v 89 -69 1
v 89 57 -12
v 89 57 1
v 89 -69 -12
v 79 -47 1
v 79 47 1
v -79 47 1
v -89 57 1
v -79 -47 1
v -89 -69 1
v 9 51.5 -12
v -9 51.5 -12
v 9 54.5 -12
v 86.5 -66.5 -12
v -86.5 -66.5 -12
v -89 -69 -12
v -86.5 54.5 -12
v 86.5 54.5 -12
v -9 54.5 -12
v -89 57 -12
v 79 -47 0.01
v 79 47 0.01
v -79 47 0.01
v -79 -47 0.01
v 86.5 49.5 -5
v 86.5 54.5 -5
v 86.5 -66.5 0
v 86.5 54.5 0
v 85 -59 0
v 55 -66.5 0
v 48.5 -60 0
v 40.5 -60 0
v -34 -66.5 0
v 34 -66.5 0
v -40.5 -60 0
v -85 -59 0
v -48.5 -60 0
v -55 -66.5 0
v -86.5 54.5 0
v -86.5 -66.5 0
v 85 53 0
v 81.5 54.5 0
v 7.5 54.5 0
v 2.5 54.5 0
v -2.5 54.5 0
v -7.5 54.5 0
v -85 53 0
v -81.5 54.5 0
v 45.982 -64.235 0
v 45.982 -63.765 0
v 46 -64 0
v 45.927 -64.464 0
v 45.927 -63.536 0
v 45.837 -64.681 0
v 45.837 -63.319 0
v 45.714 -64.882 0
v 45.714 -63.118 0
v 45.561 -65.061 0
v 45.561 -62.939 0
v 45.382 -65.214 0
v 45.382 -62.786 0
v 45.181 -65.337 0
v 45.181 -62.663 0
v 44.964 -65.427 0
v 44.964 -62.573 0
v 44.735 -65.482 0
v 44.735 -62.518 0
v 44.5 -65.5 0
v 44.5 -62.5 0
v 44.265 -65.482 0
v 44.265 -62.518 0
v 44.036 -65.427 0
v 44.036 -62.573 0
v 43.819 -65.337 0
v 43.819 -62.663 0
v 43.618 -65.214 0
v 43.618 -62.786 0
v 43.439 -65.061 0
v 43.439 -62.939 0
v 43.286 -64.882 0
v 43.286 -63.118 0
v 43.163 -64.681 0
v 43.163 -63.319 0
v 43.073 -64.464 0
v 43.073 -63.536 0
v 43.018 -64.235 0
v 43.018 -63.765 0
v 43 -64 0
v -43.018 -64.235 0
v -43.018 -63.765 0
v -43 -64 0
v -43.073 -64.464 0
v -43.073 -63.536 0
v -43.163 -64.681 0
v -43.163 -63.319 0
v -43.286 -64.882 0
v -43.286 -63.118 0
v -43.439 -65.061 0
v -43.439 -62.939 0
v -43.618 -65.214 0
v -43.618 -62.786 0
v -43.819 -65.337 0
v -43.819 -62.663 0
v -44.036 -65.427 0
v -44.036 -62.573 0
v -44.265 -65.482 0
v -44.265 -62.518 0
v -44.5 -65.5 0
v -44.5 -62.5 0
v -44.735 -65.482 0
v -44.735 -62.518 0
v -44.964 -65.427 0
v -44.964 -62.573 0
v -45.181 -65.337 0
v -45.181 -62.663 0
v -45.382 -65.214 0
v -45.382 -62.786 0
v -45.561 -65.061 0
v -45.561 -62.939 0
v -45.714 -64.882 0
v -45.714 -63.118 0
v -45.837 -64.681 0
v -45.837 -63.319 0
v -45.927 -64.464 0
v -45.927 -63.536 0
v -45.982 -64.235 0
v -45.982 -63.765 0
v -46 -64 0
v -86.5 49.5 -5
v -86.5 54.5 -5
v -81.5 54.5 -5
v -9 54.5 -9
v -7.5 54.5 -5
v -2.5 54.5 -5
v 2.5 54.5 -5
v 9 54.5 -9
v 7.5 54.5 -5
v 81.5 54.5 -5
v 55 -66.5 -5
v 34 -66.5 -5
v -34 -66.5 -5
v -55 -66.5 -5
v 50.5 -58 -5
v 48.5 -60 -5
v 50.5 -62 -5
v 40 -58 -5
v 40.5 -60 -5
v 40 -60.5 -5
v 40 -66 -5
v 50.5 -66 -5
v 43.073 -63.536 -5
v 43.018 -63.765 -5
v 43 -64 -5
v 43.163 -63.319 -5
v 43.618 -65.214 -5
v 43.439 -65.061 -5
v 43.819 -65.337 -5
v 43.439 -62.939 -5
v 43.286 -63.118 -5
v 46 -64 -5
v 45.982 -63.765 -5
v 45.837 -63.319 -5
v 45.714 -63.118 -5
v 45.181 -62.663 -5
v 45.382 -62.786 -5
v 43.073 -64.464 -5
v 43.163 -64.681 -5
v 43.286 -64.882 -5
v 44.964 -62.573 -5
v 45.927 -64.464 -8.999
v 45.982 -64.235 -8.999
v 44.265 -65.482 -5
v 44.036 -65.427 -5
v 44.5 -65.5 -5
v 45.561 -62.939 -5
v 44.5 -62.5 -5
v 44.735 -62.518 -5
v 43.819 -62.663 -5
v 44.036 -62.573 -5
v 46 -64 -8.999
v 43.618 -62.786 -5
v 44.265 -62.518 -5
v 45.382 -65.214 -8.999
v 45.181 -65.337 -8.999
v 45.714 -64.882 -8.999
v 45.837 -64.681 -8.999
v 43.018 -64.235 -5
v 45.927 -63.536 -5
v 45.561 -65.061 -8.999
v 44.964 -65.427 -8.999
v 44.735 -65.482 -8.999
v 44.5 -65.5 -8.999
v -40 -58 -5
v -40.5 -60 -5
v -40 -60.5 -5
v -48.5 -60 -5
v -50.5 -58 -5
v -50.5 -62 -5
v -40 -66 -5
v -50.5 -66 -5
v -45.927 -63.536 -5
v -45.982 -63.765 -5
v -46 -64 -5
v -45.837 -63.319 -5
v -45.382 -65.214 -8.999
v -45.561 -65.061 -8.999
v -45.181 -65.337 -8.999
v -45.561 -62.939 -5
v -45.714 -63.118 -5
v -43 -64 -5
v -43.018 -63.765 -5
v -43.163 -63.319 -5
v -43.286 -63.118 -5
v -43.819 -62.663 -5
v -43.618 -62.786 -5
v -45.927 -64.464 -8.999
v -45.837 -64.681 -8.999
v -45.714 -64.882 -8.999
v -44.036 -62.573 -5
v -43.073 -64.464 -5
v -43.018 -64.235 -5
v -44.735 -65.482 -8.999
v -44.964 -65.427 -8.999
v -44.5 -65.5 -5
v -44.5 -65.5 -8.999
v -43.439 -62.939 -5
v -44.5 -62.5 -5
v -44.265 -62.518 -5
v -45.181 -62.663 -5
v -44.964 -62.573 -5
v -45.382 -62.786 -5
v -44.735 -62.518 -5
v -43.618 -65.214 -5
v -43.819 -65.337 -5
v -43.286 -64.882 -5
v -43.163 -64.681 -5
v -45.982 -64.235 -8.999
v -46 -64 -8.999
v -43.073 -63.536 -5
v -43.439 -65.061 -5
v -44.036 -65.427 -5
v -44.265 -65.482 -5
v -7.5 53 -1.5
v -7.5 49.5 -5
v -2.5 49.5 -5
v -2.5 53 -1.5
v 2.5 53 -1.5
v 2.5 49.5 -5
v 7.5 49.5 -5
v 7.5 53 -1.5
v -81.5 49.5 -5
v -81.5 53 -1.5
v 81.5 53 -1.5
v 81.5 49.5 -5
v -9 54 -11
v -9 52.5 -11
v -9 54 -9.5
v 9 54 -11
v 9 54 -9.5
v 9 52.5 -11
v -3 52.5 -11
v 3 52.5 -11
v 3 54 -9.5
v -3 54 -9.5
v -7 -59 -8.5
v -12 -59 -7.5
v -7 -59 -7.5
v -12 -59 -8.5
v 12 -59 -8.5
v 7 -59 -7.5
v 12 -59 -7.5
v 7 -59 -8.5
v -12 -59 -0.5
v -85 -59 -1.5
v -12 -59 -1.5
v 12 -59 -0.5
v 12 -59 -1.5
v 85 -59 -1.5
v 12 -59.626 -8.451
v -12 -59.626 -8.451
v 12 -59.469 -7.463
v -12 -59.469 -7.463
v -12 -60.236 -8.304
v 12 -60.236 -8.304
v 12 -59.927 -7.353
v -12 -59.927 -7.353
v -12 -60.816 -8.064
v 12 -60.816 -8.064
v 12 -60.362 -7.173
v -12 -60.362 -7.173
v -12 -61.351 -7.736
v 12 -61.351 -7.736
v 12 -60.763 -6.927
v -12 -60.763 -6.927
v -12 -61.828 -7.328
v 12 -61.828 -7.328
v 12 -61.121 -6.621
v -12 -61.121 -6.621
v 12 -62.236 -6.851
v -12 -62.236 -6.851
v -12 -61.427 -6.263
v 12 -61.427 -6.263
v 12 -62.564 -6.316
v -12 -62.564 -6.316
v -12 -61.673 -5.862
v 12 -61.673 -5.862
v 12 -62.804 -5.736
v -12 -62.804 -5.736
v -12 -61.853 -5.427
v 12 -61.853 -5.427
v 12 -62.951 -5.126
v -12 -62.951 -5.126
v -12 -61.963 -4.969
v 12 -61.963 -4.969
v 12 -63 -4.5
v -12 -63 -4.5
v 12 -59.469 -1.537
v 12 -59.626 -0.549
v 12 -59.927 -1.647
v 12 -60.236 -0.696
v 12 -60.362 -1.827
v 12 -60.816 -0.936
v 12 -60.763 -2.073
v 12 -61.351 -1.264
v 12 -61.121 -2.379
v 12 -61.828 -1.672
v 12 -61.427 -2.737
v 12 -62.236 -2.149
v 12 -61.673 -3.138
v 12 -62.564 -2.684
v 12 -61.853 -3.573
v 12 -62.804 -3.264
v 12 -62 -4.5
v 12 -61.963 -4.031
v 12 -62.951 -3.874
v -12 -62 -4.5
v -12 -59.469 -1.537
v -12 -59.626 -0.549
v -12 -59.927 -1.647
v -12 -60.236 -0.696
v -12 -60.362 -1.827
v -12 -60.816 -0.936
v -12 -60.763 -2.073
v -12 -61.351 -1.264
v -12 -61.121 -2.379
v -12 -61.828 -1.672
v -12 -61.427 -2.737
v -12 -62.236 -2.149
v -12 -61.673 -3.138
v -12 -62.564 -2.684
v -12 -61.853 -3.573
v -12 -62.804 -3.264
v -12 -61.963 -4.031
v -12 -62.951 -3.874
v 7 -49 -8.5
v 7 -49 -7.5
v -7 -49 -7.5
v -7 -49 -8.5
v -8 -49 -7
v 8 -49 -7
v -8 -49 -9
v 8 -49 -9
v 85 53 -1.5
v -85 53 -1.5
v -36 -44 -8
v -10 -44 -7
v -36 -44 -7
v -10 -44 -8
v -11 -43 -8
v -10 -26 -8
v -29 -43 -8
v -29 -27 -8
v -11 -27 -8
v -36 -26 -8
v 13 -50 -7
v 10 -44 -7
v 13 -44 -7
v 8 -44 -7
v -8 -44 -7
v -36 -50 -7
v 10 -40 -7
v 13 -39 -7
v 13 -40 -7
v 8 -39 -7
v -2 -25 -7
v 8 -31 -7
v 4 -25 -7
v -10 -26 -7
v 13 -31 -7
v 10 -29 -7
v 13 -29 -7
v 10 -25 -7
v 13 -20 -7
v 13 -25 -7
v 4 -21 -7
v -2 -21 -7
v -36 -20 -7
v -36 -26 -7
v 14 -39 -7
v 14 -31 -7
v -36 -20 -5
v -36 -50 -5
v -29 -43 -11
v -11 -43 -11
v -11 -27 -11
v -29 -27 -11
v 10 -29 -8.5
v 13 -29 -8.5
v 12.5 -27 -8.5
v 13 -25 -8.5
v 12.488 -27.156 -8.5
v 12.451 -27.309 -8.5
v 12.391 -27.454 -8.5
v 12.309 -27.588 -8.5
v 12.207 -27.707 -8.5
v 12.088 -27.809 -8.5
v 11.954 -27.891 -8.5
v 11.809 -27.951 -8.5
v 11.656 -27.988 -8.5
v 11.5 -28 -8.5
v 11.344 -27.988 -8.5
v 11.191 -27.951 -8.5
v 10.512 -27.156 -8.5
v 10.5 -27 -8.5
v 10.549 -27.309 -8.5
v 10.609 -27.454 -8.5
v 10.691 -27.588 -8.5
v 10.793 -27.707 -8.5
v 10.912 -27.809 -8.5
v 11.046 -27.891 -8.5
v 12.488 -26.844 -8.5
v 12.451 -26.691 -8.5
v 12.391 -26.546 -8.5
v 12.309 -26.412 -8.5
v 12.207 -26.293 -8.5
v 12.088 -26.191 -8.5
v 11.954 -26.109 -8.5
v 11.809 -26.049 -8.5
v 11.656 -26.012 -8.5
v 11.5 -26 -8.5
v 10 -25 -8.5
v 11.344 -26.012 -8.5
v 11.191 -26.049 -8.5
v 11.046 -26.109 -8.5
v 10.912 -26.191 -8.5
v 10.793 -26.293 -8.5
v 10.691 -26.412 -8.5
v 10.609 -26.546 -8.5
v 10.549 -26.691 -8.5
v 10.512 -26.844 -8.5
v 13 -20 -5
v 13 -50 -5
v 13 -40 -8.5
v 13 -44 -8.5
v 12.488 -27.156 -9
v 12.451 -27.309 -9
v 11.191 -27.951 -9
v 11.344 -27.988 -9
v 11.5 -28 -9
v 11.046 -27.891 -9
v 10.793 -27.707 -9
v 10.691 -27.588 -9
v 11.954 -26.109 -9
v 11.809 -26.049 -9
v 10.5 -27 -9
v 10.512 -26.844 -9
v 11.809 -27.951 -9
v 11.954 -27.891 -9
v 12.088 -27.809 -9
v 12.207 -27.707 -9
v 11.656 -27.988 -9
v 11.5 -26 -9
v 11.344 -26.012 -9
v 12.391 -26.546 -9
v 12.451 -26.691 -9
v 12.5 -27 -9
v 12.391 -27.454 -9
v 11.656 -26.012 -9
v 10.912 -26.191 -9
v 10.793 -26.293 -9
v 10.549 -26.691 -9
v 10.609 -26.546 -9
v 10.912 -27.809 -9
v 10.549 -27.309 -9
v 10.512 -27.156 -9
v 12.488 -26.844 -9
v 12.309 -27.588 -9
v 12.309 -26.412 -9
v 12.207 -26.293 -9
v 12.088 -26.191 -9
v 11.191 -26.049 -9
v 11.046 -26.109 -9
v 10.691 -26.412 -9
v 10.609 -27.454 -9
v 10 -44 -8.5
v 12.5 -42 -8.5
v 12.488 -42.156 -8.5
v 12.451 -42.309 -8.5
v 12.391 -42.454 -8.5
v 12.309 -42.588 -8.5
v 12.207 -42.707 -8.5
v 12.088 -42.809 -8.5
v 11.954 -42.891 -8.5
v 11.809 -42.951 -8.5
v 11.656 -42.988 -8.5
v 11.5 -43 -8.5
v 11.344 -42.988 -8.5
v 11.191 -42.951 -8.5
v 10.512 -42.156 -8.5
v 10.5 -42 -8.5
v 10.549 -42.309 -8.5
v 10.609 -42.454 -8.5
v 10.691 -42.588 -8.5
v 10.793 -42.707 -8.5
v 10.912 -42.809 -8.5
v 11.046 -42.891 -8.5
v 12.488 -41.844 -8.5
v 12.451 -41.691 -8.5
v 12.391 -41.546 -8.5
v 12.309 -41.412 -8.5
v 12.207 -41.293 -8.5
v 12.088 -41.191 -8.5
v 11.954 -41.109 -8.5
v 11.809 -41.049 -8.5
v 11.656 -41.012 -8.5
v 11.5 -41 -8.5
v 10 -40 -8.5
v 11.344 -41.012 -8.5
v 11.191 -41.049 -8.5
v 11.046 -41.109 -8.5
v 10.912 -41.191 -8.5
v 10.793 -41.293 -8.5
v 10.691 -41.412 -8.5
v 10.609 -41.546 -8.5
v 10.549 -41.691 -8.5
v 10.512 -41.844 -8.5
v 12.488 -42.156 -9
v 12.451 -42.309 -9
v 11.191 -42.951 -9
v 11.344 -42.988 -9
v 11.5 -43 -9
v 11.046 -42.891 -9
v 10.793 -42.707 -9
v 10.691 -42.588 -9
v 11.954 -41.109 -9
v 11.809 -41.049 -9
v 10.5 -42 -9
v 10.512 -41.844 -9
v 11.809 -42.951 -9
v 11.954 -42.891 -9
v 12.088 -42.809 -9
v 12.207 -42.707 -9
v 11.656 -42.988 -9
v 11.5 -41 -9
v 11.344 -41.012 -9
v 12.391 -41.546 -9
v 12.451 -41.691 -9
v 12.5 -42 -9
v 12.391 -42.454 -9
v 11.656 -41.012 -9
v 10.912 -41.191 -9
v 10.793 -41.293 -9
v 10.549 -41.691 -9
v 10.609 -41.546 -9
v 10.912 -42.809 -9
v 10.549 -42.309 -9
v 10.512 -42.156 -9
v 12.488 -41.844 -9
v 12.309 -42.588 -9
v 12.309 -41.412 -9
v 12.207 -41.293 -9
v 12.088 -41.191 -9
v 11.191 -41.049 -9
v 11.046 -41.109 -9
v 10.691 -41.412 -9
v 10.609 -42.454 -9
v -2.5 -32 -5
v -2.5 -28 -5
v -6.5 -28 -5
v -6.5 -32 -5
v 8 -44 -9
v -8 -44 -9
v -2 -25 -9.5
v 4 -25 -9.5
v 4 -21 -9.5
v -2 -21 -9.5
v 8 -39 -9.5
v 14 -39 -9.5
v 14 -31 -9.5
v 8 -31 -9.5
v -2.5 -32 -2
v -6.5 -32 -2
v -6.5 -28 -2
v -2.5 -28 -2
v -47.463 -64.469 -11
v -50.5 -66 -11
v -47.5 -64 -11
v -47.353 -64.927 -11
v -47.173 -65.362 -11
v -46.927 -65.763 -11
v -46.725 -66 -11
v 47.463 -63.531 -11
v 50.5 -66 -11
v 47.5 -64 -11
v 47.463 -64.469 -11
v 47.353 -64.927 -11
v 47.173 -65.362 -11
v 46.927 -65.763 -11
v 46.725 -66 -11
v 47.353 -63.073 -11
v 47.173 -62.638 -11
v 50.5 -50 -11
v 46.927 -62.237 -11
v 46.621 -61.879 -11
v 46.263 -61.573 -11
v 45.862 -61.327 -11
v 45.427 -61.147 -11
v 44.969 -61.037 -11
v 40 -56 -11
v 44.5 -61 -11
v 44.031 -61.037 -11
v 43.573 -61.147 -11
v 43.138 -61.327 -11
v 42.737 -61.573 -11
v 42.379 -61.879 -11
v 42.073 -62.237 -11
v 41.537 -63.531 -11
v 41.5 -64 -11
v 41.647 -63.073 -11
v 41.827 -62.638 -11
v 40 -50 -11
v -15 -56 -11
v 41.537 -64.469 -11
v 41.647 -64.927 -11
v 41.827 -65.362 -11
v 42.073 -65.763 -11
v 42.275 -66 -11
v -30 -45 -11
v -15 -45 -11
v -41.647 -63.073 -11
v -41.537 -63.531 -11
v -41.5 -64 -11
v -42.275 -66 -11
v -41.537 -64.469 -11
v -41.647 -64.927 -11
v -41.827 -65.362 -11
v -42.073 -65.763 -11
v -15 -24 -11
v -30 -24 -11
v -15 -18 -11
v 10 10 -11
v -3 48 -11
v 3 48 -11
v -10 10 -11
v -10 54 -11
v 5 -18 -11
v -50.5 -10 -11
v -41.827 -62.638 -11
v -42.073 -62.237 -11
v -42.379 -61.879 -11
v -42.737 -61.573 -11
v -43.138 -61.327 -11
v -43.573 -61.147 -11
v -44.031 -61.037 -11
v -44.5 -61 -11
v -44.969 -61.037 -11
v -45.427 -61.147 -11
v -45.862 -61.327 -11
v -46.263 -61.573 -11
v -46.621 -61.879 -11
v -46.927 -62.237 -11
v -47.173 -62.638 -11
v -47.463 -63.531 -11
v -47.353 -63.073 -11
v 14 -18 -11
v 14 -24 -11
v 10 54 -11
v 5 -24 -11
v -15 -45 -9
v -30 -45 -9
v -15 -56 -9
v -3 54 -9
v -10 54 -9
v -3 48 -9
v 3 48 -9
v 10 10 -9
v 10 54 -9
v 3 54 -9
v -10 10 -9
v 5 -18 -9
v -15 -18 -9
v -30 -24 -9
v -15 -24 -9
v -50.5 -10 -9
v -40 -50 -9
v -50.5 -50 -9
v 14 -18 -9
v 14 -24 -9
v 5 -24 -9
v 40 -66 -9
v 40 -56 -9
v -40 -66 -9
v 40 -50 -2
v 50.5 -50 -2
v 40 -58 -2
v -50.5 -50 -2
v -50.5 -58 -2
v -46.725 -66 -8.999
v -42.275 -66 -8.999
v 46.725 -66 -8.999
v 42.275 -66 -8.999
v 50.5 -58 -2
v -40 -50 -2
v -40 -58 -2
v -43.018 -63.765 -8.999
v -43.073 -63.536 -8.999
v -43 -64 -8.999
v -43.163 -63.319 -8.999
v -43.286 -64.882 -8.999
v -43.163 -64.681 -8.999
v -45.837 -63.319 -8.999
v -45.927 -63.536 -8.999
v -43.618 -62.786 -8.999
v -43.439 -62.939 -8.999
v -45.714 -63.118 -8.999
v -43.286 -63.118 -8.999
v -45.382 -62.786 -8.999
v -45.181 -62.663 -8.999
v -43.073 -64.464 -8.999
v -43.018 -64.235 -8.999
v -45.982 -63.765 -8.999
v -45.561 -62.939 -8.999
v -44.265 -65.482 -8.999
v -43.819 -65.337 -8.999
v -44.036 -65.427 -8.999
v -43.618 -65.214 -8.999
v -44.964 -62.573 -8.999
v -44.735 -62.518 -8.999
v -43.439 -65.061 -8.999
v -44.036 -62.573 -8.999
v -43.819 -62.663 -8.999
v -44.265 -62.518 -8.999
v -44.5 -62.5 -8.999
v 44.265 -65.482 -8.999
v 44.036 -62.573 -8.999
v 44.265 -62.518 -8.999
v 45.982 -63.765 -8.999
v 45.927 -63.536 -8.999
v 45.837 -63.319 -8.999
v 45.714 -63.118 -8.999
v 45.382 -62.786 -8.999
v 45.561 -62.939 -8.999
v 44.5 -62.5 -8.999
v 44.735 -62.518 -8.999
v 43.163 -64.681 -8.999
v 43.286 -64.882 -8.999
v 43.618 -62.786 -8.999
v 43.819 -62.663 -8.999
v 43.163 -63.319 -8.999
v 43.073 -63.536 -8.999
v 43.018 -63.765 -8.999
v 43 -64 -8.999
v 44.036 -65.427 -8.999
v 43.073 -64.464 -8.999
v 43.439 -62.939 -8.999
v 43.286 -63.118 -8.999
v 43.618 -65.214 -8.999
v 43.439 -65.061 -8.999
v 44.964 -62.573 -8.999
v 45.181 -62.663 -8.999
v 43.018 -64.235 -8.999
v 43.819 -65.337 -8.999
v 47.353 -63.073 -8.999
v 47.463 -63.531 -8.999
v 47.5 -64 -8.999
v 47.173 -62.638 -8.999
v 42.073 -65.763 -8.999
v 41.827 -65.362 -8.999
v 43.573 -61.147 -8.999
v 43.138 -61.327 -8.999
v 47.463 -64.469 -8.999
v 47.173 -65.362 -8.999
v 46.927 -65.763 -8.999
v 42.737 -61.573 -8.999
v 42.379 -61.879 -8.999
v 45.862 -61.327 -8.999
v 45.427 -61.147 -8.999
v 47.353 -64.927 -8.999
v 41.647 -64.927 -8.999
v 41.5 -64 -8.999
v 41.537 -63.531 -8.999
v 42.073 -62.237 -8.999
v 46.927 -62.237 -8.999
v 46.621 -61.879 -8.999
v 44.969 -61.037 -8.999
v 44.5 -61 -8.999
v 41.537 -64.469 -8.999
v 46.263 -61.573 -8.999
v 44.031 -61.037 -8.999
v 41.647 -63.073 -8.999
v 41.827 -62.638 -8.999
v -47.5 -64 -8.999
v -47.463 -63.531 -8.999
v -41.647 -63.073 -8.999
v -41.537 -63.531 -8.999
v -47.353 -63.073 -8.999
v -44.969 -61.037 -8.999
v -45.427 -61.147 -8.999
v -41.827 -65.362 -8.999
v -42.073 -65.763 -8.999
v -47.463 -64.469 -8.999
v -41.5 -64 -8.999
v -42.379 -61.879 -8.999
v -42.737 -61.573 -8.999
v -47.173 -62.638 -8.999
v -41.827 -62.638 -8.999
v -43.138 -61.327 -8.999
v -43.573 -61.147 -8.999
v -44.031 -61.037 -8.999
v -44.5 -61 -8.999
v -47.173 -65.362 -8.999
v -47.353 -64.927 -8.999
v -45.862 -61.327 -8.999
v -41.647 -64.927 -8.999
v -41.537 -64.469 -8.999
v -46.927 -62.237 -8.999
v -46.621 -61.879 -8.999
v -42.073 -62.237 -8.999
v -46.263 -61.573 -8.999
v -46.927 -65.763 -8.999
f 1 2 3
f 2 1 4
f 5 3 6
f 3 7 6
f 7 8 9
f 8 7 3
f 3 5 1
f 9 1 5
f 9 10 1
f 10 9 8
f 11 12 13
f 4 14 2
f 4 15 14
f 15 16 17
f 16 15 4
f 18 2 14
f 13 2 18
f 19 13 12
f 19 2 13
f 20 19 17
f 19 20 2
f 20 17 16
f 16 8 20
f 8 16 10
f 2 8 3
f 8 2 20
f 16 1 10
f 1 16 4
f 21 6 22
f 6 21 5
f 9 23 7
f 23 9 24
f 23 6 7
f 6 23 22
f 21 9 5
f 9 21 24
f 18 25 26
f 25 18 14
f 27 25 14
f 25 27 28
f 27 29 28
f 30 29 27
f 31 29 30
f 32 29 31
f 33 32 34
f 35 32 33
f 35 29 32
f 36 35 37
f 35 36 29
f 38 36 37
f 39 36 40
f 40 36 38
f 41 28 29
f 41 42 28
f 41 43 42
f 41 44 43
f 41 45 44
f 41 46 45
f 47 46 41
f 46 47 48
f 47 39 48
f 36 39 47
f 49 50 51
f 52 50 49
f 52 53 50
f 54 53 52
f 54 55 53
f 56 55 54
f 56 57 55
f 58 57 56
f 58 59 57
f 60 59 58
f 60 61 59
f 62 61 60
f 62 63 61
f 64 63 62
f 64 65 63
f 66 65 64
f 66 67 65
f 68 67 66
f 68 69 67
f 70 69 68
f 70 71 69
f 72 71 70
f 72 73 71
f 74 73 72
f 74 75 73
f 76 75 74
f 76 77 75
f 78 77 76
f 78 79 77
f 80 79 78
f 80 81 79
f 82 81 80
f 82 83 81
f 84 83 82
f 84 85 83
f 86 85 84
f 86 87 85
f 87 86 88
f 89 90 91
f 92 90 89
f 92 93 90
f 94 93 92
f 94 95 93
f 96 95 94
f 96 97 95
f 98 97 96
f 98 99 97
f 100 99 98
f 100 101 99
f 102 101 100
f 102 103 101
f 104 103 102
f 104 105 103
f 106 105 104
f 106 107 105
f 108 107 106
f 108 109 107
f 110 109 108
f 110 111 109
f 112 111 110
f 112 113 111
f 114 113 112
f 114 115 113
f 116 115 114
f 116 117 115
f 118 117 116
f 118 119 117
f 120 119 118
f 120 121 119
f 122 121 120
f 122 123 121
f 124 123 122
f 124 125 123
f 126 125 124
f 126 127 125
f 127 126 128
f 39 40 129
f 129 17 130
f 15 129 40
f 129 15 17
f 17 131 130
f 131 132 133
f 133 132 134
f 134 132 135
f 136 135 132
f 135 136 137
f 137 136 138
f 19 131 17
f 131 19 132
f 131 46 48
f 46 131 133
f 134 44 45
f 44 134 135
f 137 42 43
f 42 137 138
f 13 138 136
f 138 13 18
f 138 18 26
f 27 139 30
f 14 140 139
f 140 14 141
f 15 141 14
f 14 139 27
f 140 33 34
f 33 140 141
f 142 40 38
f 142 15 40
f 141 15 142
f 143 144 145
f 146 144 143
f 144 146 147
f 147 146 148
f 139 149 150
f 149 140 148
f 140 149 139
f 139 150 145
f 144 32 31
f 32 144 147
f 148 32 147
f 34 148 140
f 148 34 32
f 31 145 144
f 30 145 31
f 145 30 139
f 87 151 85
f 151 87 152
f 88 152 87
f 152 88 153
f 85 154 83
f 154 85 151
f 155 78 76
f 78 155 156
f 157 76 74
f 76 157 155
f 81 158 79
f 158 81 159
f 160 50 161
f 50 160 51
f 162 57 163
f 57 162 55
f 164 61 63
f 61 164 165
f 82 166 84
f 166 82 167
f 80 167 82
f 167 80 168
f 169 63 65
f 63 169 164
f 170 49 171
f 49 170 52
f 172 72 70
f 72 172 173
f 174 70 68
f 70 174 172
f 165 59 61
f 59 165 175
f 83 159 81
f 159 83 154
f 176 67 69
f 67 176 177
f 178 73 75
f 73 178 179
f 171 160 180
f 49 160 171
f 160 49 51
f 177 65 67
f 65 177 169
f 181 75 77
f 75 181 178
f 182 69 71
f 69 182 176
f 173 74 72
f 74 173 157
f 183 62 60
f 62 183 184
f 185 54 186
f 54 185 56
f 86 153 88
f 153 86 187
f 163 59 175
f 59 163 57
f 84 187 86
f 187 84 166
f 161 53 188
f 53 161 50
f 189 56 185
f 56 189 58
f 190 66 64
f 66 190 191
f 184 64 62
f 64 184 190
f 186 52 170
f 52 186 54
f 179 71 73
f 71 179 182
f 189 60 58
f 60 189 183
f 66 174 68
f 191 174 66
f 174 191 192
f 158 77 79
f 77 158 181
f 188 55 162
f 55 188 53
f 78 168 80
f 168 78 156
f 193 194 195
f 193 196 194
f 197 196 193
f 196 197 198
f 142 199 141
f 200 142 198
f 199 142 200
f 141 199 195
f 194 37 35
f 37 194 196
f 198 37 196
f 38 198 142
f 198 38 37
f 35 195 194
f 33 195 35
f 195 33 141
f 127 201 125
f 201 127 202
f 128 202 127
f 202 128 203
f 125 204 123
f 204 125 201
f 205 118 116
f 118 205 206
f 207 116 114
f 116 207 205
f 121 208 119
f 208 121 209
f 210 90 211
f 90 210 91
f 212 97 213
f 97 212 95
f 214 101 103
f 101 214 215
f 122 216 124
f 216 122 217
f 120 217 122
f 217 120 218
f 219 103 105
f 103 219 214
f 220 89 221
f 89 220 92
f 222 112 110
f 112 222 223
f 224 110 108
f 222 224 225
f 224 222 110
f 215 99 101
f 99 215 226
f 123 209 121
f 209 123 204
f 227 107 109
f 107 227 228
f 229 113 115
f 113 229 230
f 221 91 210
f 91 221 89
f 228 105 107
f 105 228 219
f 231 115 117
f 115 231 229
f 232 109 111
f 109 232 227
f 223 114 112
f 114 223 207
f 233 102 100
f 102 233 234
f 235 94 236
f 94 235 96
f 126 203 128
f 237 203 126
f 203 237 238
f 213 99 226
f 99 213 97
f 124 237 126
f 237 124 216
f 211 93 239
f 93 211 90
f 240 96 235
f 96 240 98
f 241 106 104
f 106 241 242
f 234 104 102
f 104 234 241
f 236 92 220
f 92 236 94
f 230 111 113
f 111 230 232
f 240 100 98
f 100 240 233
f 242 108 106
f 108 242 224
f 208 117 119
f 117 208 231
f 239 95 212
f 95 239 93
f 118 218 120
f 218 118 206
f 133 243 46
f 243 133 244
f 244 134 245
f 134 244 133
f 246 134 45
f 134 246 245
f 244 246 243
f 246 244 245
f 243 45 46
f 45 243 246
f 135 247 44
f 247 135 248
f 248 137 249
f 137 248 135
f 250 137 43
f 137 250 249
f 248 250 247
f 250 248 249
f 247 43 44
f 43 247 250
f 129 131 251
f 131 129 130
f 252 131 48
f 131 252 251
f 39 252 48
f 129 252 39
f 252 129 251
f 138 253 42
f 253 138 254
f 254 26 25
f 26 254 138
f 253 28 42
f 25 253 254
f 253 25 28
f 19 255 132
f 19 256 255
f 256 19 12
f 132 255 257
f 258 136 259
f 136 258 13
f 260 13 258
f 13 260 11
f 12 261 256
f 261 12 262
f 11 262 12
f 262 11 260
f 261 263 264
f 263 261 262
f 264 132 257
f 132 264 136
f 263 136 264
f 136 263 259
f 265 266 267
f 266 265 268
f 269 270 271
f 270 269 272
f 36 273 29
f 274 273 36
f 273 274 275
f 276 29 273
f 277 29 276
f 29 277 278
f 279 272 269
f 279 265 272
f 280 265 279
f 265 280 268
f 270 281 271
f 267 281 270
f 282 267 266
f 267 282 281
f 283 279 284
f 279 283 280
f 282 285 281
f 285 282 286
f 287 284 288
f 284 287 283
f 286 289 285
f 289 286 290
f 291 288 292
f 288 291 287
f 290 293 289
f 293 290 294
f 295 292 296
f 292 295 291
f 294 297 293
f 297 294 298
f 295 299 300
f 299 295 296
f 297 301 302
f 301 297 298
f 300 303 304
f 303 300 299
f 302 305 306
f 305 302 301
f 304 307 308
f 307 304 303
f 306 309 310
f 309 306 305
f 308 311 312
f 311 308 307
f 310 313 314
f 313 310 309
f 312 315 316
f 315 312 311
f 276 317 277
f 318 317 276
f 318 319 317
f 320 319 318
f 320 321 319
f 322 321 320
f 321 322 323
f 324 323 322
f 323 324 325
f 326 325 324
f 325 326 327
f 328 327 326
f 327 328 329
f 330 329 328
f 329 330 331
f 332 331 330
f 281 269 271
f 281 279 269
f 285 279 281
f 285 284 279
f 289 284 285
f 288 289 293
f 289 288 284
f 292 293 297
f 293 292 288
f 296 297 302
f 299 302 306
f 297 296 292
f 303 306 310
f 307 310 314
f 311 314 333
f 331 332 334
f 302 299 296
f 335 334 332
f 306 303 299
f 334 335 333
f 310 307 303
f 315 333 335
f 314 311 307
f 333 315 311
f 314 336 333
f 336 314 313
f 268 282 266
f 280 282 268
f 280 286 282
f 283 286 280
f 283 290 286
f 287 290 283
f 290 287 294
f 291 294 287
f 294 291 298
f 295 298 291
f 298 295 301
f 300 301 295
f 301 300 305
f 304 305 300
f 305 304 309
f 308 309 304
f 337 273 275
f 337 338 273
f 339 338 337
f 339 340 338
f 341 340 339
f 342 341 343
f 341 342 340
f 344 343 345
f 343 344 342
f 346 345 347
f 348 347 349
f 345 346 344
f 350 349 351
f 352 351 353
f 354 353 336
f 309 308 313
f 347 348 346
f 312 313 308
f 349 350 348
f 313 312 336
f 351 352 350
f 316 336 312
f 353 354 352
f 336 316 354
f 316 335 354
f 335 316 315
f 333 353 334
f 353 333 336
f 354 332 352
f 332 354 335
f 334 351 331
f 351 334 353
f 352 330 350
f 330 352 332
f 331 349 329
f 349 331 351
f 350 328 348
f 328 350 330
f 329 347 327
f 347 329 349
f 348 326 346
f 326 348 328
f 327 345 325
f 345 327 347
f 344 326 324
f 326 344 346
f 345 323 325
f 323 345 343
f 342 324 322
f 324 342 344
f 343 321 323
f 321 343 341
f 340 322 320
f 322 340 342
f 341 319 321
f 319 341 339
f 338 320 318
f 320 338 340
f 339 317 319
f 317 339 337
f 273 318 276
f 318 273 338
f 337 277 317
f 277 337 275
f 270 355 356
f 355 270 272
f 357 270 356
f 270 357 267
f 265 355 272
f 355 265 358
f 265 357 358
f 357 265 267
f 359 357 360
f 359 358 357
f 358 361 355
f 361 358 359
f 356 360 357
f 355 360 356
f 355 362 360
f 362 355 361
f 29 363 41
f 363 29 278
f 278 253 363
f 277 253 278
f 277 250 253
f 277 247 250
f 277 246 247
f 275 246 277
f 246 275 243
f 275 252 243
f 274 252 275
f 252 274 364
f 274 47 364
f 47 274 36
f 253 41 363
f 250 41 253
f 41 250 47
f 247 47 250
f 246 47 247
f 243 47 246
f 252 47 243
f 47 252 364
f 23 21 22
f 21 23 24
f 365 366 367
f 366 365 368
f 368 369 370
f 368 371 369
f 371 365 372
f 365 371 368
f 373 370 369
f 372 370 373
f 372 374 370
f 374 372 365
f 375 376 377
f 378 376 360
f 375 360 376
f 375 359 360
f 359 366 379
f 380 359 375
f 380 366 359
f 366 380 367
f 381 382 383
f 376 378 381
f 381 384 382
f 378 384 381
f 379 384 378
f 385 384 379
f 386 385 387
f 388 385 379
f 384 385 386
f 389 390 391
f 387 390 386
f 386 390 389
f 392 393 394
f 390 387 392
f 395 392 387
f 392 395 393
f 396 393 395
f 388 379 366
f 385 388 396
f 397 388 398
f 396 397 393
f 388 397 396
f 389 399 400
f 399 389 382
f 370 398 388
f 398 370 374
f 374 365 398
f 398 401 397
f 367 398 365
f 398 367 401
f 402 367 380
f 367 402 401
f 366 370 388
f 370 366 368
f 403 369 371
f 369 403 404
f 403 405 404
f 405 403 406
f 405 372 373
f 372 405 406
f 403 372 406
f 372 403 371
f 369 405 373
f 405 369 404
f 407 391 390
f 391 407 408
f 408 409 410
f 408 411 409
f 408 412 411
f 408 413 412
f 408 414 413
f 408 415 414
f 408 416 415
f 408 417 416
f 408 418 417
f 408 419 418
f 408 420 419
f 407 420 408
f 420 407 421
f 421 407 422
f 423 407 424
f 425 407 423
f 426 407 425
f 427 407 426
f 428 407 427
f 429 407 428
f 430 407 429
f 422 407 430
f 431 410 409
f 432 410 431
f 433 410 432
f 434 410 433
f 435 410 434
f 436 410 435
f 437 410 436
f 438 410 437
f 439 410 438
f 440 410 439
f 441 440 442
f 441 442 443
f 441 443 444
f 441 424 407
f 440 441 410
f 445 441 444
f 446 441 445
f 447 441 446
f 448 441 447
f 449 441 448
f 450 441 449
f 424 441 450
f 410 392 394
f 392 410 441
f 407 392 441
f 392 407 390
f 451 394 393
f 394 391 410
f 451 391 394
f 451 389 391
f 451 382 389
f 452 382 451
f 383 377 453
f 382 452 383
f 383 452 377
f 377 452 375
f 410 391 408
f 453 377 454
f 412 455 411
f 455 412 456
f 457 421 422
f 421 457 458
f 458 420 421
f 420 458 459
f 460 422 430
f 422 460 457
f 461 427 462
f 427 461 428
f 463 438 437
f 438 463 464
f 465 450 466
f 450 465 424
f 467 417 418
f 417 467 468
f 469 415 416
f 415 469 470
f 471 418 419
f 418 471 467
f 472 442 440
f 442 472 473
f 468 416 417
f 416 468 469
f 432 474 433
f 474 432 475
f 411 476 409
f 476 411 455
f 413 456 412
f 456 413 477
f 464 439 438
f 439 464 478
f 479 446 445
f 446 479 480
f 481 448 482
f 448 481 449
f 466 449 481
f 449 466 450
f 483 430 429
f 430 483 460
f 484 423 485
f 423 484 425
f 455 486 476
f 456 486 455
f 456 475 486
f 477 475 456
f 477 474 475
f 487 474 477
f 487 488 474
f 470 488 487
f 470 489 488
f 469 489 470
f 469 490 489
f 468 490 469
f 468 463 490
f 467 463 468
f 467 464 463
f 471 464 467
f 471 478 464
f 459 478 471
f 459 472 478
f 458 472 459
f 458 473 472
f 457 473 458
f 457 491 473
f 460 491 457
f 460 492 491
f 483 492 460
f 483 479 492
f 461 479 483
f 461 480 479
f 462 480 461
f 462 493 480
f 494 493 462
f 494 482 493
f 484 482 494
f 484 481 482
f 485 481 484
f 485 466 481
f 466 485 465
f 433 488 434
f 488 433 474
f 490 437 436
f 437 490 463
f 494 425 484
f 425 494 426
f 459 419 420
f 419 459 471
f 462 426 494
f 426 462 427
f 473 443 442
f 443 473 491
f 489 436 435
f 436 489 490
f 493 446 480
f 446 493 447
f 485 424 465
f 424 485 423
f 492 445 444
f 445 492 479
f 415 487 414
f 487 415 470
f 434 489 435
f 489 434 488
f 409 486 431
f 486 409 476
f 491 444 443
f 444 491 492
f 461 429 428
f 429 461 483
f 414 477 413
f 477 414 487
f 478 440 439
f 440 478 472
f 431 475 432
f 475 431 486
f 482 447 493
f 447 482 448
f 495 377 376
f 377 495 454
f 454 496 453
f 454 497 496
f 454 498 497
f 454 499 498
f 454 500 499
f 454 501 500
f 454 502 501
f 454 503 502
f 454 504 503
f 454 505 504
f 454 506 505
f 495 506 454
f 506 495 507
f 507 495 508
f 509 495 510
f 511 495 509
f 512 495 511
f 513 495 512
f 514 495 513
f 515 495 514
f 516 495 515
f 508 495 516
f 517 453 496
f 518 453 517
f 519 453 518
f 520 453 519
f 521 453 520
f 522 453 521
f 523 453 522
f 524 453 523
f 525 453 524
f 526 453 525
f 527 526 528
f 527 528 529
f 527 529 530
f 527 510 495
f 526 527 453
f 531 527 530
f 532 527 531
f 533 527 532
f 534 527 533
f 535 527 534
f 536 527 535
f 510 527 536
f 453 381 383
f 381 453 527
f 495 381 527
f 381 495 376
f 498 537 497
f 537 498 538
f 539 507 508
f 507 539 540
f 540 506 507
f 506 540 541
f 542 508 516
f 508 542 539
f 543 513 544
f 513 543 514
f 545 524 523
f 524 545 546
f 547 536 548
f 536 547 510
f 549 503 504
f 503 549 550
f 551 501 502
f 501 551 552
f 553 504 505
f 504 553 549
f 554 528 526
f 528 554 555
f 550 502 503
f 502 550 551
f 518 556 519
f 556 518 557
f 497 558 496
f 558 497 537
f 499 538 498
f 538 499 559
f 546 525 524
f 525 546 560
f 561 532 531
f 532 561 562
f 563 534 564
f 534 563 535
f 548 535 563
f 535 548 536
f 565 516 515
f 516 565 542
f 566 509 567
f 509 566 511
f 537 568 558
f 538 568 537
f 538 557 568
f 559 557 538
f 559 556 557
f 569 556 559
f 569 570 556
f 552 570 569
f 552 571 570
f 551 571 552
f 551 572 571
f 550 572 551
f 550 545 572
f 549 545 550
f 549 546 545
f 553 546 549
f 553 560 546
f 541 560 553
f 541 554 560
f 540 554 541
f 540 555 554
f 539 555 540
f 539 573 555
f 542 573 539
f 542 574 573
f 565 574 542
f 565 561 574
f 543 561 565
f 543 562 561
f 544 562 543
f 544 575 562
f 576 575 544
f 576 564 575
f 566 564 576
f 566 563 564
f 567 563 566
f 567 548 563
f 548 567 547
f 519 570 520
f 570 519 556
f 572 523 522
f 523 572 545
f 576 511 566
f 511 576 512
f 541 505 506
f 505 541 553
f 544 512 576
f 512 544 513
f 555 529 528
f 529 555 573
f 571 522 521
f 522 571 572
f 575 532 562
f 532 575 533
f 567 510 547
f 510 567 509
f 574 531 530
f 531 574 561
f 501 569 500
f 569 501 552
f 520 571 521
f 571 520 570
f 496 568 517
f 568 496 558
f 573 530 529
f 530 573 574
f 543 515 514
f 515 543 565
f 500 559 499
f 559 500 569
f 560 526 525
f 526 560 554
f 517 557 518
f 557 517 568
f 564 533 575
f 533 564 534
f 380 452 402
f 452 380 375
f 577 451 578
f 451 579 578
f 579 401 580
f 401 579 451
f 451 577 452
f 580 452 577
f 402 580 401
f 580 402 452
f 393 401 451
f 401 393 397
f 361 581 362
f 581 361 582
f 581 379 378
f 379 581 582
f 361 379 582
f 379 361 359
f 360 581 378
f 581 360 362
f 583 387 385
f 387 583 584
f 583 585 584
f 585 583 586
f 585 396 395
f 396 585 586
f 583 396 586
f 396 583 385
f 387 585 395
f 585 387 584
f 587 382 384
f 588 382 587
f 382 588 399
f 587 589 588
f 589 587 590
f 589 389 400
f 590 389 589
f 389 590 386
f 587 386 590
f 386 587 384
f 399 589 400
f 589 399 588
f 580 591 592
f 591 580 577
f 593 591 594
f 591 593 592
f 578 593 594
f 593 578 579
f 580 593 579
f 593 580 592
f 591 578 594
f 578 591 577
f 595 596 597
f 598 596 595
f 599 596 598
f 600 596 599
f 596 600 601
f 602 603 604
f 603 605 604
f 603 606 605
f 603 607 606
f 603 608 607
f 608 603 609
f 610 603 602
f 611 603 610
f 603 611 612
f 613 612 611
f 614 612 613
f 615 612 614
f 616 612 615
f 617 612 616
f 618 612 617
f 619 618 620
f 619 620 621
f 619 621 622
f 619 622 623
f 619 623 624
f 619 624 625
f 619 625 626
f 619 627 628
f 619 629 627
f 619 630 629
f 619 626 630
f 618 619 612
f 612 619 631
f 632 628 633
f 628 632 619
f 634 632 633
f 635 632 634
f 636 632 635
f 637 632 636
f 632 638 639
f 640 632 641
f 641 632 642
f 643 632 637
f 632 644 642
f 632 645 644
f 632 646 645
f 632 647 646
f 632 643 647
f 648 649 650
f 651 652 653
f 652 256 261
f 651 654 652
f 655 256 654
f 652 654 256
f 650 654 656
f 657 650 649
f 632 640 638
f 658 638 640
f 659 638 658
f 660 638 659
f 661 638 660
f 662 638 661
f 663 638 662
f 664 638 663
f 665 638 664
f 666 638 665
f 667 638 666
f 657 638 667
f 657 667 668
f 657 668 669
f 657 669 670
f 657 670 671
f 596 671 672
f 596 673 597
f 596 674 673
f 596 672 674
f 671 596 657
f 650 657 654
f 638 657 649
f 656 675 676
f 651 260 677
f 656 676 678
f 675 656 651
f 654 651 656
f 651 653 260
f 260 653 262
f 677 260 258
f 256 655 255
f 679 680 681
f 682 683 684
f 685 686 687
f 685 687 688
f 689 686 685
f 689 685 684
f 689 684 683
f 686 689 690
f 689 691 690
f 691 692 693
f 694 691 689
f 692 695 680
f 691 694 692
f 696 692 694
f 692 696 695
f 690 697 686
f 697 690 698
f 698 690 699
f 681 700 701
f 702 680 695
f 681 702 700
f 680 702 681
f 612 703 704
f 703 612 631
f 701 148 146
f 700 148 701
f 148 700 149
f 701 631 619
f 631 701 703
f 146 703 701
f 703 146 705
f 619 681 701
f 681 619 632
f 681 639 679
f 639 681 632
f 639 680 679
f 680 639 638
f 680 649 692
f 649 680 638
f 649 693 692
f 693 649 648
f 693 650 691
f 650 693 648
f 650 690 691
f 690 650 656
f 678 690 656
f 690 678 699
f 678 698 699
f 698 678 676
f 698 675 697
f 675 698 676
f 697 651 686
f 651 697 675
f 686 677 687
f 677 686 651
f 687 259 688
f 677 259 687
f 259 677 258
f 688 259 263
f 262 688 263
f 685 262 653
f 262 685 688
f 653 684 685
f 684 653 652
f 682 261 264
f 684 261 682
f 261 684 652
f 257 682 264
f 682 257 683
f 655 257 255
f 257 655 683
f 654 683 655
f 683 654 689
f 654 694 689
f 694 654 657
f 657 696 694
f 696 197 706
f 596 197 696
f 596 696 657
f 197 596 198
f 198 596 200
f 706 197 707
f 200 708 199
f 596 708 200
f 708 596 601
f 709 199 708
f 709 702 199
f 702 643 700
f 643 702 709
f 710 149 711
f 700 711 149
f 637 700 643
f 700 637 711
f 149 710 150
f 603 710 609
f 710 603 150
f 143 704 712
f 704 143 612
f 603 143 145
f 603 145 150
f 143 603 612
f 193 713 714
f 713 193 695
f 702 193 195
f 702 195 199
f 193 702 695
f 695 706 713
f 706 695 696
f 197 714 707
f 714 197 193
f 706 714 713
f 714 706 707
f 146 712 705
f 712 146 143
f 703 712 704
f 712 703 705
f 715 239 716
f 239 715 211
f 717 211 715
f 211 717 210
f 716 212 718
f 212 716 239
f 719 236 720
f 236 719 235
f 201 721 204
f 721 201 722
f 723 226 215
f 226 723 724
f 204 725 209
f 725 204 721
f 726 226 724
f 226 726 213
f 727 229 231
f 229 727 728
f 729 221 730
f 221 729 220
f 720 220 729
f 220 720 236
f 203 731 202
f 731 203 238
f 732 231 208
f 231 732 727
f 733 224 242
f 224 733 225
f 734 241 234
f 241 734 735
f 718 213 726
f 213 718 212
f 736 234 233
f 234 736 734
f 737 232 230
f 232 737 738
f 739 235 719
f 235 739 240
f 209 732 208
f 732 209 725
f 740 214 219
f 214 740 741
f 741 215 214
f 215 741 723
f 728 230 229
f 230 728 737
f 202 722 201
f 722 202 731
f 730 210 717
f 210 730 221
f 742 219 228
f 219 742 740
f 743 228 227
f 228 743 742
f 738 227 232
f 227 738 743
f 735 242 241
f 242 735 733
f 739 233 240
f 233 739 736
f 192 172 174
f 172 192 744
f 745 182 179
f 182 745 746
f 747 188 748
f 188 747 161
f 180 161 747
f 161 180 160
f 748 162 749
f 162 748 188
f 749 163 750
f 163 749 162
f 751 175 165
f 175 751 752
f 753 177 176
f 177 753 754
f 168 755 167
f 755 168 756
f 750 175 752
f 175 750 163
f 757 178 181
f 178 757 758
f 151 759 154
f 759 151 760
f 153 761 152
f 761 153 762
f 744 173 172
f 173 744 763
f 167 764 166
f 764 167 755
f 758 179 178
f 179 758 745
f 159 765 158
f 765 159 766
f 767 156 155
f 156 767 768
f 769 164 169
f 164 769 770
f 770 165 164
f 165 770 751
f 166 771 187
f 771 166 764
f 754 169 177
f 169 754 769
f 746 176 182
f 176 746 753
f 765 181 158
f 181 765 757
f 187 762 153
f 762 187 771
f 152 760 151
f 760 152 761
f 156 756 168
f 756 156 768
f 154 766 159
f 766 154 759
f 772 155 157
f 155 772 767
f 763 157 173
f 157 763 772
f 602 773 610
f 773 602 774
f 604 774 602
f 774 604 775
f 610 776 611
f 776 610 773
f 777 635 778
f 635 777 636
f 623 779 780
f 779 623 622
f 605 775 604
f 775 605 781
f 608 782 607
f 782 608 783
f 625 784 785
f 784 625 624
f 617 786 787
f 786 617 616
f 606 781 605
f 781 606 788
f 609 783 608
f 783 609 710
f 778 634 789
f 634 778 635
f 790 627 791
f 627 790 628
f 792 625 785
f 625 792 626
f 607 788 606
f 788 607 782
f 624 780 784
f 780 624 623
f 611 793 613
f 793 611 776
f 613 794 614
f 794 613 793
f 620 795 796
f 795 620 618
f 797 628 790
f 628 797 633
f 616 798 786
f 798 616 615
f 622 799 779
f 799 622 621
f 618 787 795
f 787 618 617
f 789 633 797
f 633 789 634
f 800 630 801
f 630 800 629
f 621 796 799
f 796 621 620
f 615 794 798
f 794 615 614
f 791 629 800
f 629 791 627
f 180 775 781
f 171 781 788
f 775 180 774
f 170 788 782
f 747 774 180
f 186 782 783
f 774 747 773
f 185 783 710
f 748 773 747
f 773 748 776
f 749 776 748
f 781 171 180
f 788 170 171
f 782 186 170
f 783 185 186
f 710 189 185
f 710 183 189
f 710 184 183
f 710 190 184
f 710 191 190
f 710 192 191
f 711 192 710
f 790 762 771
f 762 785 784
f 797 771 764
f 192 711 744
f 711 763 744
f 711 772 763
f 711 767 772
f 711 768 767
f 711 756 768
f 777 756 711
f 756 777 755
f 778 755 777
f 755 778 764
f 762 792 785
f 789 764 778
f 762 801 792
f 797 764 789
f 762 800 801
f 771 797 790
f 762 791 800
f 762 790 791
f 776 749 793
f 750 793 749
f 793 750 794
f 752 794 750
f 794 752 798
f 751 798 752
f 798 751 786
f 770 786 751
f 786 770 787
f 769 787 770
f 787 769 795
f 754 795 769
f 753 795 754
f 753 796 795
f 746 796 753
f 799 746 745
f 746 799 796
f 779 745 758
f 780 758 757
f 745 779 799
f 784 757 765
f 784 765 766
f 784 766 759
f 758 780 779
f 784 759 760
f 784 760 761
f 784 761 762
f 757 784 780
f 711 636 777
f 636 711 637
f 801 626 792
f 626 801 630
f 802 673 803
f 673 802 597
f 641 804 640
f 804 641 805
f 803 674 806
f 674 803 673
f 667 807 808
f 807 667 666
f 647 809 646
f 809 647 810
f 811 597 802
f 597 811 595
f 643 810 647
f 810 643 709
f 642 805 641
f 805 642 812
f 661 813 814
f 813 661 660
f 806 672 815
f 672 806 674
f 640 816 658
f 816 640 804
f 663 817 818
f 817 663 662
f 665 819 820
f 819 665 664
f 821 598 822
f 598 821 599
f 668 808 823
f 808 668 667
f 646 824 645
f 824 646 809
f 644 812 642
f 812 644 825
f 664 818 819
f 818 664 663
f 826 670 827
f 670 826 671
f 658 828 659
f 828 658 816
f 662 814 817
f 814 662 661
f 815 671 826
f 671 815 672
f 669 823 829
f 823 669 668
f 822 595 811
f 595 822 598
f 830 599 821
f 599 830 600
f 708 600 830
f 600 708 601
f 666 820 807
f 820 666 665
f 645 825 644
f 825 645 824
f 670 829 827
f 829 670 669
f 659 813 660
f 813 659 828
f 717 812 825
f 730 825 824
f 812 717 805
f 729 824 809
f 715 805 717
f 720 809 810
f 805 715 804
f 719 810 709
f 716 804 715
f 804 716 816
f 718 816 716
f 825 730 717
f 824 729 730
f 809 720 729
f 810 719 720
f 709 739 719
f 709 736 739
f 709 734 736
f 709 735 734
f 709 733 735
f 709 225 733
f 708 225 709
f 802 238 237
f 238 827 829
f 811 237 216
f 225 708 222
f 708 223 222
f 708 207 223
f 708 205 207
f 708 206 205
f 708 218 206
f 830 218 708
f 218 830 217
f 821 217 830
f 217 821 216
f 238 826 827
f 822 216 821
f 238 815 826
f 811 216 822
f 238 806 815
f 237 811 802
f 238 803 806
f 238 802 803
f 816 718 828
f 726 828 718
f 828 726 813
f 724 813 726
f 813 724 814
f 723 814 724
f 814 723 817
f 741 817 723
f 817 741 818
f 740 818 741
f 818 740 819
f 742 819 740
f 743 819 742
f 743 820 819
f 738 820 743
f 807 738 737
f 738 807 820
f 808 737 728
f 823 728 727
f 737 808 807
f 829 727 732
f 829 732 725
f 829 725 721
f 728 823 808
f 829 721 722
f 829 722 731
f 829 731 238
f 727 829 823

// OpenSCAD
// file: display.scad
module waveshare_7in5(straight = true) {
        color("grey") translate([-85, -56, 0]) cube([170, 112, 1.5]);
        color("white") translate([-79, -44, 0.01]) cube([158, 94, 1.5]);

        if (straight) {
                color("gold") translate([-12, -70, 0]) cube([24, 14, 1]);
                color("gold") translate([-7, -80, 0]) cube([14, 10, 1]);
        } else {
                color("gold") translate([12, -56, -3]) rotate([0, 90, 180])
                rotate_extrude(angle = 180) translate([3, 0, 0]) square([1, 24]);
                color("gold") translate([-7, -56, -7]) cube([14, 10, 1]);
        }
}
// file: gehause.scad
module backplate() {
  difference() {
    union() {
      {
        translate([ 0, 0, -12 ]) linear_extrude(2) polygon([
          [ 10, 10 ],     [ 10, 54 ], // top left
          [ 3, 54 ],      [ 3, 48 ],      [ -3, 48 ],   [ -3, 54 ],
          [ -10, 54 ],    [ -10, 10 ], //  end of zunge
          [ -50.5, -10 ], [ -50.5, -66 ], [ -15, -66 ], [ 50.5, -66 ],
          [ 50.5, -50 ],  [ 40, -50 ],    [ 40, -56 ],  [ -15, -56 ],
          [ -15, -45 ],   [ -30, -45 ],   [ -30, -24 ], [ -15, -24 ],
          [ -15, -18 ],   [ 5, -18 ],     [ 5, -24 ],   [ 14, -24 ],
          [ 14, -18 ],
        ]);
        translate([ 0, 0, -10 ]) linear_extrude(4) polygon([
          [ -50.5, -50 ],
          [ -50.5, -66 ],
          [ -40, -66 ],
          [ -40, -50 ],
        ]);
        translate([ 0, 0, -10 ]) linear_extrude(4) polygon([
          [ 50.5, -50 ],
          [ 50.5, -66 ],
          [ 40, -66 ],
          [ 40, -50 ],
        ]);
        translate([ 0, 0, -6 ]) linear_extrude(3) polygon([
          [ -50.5, -50 ],
          [ -50.5, -58 ],
          [ -40, -58 ],
          [ -40, -50 ],
        ]);
        translate([ 0, 0, -6 ]) linear_extrude(3) polygon([
          [ 50.5, -50 ],
          [ 50.5, -58 ],
          [ 40, -58 ],
          [ 40, -50 ],
        ]);
      }
    }
    translate([ -44.5, -64, 0 ]) cylinder(h = 40, r = 1.5, center = true);
    translate([ 44.5, -64, 0 ]) cylinder(h = 40, r = 1.5, center = true);
    translate([ 44.5, -64, -11 ]) cylinder(h = 2.001, r = 3, center = true);
    translate([ -44.5, -64, -11 ]) cylinder(h = 2.001, r = 3, center = true);
  }
}

module frontside(top_bezel = 10, bottom_bezel = 22, side_bezels = 10,
                 wall_thickness = 2.5, depth = 13, front_thickness = 1) {

  viewport_width = 158;
  viewport_height = 94;

  width = viewport_width + side_bezels * 2;
  height = viewport_height + top_bezel + bottom_bezel;
  y_offset = (top_bezel - bottom_bezel) / 2;

  difference() {
    translate([ 0, y_offset, front_thickness - depth / 2 ])
        cube([ width, height, depth ], center = true);            // outline
    cube([ viewport_width, viewport_height, 30 ], center = true); // view area
    translate([ 0, y_offset, -depth / 2 ])
        cube([ width - wall_thickness * 2, height - wall_thickness * 2, depth ],
             center = true); // hole
  };

  // Wedges to hold the display
  translate([ -5, height / 2 + y_offset - wall_thickness, 0 ]) edge(5);
  translate([ 5, height / 2 + y_offset - wall_thickness, 0 ]) edge(5);
  translate([
    -width / 2 + wall_thickness + 2.5, height / 2 + y_offset - wall_thickness, 0
  ]) edge(5);
  translate([
    width / 2 - wall_thickness - 2.5, height / 2 + y_offset - wall_thickness, 0
  ]) edge(5);

  translate([ width / 4, -height / 2 + y_offset + wall_thickness + 2.5, 0 ])
      rotate([ 0, 180, 0 ]) bohrloch(5);
  translate([ -width / 4, -height / 2 + y_offset + wall_thickness + 2.5, 0 ])
      rotate([ 0, 180, 0 ]) bohrloch(5);

  // wedge for total hold
  translate([ 0, height / 2 + y_offset - wall_thickness, -depth + 4 ])
      edge(3, 18);
}

module bohrloch(height, hole = 1.5) {
  depth = 8;
  translate([ 0, 0, height / 2 ]) difference() {
    union() {
      cube([ 8, depth, height ], center = true);
      translate([ 4, depth / 2, 0 ]) rotate([ 0, 90, 90 ])
          edge(width = height, size = depth);
      translate([ -4 - depth, -depth / 2, 0 ]) rotate([ 0, 90, 180 ])
          edge(width = height, size = depth);
    }
    cylinder(h = height + 1, r = hole, center = true);
  }
}

module edge(size = 10, width = 5) {
  translate([ -width / 2, -size, -size ]) rotate([ 90, 0, 90 ])
      linear_extrude(width)
          polygon(points = [ [ 0, 0 ], [ size, 0 ], [ size, size ] ]);
}
// file: esp32.scad
module waveshare_esp32_driver(with_pinheader = true) {
        // board
        color("blue") cube([30, 49, 2]);
        // top side
        translate([6, 23, 2]) esp32();
        color("white") translate([24, 5, 2]) cube([5, 16, 2]);
        color("black") translate([1, 9, 2]) cube([4, 6, 2.5]);
        color("silver") translate([11, -1, 2]) cube([8, 6, 2.5]);
        translate([5, 0, 2]) button();
        translate([20, 0, 2]) button();
        // bottom side
        color("black") translate([8, 15.5, -3]) cube([4, 4, 3]);
        if (with_pinheader) {
                translate([3.5, 0, 0]) rotate([0, 180, 0]) smd_pinheader();
                translate([26, 0, 0]) rotate([0, 180, 0]) smd_pinheader();
        }
}

module smd_pinheader() {
        for (i = [0: 18]) {
                translate([0, 1.27 + i * 2.54, 0]) rotate([0, 0, i * 180]) smd_pin();
        }
}

module smd_pin() {
        color("yellow") translate([0, 0, 2]) cube(2.54, center = true);
        color("gold") translate([0, 0, 5]) cube([0.7, 0.7, 10], center = true);
        color("gold") translate([1.5, 0, 0.35])
        cube([3, 0.7, 0.7], center = true);
}

module button() {
        color("silver") cube([4, 3, 1.5]);
        color("black") translate([2, 1.5, 1.5]) cylinder(1, 1, center = true);
}

module esp32() {
        color("black") cube([18, 26, 1]);
        color("silver") translate([1, 1, 1]) cube([16, 18, 3]);
}
// main file
include <esp32.scad>
include <gehause.scad>
include <display.scad>

$fn = 40;

frontside();

translate([0, -3, -1.5]) waveshare_7in5(false);

translate([13, -20, -5]) rotate([0, 180, 90]) waveshare_esp32_driver(false);

translate([0, 0, 1]) backplate();
